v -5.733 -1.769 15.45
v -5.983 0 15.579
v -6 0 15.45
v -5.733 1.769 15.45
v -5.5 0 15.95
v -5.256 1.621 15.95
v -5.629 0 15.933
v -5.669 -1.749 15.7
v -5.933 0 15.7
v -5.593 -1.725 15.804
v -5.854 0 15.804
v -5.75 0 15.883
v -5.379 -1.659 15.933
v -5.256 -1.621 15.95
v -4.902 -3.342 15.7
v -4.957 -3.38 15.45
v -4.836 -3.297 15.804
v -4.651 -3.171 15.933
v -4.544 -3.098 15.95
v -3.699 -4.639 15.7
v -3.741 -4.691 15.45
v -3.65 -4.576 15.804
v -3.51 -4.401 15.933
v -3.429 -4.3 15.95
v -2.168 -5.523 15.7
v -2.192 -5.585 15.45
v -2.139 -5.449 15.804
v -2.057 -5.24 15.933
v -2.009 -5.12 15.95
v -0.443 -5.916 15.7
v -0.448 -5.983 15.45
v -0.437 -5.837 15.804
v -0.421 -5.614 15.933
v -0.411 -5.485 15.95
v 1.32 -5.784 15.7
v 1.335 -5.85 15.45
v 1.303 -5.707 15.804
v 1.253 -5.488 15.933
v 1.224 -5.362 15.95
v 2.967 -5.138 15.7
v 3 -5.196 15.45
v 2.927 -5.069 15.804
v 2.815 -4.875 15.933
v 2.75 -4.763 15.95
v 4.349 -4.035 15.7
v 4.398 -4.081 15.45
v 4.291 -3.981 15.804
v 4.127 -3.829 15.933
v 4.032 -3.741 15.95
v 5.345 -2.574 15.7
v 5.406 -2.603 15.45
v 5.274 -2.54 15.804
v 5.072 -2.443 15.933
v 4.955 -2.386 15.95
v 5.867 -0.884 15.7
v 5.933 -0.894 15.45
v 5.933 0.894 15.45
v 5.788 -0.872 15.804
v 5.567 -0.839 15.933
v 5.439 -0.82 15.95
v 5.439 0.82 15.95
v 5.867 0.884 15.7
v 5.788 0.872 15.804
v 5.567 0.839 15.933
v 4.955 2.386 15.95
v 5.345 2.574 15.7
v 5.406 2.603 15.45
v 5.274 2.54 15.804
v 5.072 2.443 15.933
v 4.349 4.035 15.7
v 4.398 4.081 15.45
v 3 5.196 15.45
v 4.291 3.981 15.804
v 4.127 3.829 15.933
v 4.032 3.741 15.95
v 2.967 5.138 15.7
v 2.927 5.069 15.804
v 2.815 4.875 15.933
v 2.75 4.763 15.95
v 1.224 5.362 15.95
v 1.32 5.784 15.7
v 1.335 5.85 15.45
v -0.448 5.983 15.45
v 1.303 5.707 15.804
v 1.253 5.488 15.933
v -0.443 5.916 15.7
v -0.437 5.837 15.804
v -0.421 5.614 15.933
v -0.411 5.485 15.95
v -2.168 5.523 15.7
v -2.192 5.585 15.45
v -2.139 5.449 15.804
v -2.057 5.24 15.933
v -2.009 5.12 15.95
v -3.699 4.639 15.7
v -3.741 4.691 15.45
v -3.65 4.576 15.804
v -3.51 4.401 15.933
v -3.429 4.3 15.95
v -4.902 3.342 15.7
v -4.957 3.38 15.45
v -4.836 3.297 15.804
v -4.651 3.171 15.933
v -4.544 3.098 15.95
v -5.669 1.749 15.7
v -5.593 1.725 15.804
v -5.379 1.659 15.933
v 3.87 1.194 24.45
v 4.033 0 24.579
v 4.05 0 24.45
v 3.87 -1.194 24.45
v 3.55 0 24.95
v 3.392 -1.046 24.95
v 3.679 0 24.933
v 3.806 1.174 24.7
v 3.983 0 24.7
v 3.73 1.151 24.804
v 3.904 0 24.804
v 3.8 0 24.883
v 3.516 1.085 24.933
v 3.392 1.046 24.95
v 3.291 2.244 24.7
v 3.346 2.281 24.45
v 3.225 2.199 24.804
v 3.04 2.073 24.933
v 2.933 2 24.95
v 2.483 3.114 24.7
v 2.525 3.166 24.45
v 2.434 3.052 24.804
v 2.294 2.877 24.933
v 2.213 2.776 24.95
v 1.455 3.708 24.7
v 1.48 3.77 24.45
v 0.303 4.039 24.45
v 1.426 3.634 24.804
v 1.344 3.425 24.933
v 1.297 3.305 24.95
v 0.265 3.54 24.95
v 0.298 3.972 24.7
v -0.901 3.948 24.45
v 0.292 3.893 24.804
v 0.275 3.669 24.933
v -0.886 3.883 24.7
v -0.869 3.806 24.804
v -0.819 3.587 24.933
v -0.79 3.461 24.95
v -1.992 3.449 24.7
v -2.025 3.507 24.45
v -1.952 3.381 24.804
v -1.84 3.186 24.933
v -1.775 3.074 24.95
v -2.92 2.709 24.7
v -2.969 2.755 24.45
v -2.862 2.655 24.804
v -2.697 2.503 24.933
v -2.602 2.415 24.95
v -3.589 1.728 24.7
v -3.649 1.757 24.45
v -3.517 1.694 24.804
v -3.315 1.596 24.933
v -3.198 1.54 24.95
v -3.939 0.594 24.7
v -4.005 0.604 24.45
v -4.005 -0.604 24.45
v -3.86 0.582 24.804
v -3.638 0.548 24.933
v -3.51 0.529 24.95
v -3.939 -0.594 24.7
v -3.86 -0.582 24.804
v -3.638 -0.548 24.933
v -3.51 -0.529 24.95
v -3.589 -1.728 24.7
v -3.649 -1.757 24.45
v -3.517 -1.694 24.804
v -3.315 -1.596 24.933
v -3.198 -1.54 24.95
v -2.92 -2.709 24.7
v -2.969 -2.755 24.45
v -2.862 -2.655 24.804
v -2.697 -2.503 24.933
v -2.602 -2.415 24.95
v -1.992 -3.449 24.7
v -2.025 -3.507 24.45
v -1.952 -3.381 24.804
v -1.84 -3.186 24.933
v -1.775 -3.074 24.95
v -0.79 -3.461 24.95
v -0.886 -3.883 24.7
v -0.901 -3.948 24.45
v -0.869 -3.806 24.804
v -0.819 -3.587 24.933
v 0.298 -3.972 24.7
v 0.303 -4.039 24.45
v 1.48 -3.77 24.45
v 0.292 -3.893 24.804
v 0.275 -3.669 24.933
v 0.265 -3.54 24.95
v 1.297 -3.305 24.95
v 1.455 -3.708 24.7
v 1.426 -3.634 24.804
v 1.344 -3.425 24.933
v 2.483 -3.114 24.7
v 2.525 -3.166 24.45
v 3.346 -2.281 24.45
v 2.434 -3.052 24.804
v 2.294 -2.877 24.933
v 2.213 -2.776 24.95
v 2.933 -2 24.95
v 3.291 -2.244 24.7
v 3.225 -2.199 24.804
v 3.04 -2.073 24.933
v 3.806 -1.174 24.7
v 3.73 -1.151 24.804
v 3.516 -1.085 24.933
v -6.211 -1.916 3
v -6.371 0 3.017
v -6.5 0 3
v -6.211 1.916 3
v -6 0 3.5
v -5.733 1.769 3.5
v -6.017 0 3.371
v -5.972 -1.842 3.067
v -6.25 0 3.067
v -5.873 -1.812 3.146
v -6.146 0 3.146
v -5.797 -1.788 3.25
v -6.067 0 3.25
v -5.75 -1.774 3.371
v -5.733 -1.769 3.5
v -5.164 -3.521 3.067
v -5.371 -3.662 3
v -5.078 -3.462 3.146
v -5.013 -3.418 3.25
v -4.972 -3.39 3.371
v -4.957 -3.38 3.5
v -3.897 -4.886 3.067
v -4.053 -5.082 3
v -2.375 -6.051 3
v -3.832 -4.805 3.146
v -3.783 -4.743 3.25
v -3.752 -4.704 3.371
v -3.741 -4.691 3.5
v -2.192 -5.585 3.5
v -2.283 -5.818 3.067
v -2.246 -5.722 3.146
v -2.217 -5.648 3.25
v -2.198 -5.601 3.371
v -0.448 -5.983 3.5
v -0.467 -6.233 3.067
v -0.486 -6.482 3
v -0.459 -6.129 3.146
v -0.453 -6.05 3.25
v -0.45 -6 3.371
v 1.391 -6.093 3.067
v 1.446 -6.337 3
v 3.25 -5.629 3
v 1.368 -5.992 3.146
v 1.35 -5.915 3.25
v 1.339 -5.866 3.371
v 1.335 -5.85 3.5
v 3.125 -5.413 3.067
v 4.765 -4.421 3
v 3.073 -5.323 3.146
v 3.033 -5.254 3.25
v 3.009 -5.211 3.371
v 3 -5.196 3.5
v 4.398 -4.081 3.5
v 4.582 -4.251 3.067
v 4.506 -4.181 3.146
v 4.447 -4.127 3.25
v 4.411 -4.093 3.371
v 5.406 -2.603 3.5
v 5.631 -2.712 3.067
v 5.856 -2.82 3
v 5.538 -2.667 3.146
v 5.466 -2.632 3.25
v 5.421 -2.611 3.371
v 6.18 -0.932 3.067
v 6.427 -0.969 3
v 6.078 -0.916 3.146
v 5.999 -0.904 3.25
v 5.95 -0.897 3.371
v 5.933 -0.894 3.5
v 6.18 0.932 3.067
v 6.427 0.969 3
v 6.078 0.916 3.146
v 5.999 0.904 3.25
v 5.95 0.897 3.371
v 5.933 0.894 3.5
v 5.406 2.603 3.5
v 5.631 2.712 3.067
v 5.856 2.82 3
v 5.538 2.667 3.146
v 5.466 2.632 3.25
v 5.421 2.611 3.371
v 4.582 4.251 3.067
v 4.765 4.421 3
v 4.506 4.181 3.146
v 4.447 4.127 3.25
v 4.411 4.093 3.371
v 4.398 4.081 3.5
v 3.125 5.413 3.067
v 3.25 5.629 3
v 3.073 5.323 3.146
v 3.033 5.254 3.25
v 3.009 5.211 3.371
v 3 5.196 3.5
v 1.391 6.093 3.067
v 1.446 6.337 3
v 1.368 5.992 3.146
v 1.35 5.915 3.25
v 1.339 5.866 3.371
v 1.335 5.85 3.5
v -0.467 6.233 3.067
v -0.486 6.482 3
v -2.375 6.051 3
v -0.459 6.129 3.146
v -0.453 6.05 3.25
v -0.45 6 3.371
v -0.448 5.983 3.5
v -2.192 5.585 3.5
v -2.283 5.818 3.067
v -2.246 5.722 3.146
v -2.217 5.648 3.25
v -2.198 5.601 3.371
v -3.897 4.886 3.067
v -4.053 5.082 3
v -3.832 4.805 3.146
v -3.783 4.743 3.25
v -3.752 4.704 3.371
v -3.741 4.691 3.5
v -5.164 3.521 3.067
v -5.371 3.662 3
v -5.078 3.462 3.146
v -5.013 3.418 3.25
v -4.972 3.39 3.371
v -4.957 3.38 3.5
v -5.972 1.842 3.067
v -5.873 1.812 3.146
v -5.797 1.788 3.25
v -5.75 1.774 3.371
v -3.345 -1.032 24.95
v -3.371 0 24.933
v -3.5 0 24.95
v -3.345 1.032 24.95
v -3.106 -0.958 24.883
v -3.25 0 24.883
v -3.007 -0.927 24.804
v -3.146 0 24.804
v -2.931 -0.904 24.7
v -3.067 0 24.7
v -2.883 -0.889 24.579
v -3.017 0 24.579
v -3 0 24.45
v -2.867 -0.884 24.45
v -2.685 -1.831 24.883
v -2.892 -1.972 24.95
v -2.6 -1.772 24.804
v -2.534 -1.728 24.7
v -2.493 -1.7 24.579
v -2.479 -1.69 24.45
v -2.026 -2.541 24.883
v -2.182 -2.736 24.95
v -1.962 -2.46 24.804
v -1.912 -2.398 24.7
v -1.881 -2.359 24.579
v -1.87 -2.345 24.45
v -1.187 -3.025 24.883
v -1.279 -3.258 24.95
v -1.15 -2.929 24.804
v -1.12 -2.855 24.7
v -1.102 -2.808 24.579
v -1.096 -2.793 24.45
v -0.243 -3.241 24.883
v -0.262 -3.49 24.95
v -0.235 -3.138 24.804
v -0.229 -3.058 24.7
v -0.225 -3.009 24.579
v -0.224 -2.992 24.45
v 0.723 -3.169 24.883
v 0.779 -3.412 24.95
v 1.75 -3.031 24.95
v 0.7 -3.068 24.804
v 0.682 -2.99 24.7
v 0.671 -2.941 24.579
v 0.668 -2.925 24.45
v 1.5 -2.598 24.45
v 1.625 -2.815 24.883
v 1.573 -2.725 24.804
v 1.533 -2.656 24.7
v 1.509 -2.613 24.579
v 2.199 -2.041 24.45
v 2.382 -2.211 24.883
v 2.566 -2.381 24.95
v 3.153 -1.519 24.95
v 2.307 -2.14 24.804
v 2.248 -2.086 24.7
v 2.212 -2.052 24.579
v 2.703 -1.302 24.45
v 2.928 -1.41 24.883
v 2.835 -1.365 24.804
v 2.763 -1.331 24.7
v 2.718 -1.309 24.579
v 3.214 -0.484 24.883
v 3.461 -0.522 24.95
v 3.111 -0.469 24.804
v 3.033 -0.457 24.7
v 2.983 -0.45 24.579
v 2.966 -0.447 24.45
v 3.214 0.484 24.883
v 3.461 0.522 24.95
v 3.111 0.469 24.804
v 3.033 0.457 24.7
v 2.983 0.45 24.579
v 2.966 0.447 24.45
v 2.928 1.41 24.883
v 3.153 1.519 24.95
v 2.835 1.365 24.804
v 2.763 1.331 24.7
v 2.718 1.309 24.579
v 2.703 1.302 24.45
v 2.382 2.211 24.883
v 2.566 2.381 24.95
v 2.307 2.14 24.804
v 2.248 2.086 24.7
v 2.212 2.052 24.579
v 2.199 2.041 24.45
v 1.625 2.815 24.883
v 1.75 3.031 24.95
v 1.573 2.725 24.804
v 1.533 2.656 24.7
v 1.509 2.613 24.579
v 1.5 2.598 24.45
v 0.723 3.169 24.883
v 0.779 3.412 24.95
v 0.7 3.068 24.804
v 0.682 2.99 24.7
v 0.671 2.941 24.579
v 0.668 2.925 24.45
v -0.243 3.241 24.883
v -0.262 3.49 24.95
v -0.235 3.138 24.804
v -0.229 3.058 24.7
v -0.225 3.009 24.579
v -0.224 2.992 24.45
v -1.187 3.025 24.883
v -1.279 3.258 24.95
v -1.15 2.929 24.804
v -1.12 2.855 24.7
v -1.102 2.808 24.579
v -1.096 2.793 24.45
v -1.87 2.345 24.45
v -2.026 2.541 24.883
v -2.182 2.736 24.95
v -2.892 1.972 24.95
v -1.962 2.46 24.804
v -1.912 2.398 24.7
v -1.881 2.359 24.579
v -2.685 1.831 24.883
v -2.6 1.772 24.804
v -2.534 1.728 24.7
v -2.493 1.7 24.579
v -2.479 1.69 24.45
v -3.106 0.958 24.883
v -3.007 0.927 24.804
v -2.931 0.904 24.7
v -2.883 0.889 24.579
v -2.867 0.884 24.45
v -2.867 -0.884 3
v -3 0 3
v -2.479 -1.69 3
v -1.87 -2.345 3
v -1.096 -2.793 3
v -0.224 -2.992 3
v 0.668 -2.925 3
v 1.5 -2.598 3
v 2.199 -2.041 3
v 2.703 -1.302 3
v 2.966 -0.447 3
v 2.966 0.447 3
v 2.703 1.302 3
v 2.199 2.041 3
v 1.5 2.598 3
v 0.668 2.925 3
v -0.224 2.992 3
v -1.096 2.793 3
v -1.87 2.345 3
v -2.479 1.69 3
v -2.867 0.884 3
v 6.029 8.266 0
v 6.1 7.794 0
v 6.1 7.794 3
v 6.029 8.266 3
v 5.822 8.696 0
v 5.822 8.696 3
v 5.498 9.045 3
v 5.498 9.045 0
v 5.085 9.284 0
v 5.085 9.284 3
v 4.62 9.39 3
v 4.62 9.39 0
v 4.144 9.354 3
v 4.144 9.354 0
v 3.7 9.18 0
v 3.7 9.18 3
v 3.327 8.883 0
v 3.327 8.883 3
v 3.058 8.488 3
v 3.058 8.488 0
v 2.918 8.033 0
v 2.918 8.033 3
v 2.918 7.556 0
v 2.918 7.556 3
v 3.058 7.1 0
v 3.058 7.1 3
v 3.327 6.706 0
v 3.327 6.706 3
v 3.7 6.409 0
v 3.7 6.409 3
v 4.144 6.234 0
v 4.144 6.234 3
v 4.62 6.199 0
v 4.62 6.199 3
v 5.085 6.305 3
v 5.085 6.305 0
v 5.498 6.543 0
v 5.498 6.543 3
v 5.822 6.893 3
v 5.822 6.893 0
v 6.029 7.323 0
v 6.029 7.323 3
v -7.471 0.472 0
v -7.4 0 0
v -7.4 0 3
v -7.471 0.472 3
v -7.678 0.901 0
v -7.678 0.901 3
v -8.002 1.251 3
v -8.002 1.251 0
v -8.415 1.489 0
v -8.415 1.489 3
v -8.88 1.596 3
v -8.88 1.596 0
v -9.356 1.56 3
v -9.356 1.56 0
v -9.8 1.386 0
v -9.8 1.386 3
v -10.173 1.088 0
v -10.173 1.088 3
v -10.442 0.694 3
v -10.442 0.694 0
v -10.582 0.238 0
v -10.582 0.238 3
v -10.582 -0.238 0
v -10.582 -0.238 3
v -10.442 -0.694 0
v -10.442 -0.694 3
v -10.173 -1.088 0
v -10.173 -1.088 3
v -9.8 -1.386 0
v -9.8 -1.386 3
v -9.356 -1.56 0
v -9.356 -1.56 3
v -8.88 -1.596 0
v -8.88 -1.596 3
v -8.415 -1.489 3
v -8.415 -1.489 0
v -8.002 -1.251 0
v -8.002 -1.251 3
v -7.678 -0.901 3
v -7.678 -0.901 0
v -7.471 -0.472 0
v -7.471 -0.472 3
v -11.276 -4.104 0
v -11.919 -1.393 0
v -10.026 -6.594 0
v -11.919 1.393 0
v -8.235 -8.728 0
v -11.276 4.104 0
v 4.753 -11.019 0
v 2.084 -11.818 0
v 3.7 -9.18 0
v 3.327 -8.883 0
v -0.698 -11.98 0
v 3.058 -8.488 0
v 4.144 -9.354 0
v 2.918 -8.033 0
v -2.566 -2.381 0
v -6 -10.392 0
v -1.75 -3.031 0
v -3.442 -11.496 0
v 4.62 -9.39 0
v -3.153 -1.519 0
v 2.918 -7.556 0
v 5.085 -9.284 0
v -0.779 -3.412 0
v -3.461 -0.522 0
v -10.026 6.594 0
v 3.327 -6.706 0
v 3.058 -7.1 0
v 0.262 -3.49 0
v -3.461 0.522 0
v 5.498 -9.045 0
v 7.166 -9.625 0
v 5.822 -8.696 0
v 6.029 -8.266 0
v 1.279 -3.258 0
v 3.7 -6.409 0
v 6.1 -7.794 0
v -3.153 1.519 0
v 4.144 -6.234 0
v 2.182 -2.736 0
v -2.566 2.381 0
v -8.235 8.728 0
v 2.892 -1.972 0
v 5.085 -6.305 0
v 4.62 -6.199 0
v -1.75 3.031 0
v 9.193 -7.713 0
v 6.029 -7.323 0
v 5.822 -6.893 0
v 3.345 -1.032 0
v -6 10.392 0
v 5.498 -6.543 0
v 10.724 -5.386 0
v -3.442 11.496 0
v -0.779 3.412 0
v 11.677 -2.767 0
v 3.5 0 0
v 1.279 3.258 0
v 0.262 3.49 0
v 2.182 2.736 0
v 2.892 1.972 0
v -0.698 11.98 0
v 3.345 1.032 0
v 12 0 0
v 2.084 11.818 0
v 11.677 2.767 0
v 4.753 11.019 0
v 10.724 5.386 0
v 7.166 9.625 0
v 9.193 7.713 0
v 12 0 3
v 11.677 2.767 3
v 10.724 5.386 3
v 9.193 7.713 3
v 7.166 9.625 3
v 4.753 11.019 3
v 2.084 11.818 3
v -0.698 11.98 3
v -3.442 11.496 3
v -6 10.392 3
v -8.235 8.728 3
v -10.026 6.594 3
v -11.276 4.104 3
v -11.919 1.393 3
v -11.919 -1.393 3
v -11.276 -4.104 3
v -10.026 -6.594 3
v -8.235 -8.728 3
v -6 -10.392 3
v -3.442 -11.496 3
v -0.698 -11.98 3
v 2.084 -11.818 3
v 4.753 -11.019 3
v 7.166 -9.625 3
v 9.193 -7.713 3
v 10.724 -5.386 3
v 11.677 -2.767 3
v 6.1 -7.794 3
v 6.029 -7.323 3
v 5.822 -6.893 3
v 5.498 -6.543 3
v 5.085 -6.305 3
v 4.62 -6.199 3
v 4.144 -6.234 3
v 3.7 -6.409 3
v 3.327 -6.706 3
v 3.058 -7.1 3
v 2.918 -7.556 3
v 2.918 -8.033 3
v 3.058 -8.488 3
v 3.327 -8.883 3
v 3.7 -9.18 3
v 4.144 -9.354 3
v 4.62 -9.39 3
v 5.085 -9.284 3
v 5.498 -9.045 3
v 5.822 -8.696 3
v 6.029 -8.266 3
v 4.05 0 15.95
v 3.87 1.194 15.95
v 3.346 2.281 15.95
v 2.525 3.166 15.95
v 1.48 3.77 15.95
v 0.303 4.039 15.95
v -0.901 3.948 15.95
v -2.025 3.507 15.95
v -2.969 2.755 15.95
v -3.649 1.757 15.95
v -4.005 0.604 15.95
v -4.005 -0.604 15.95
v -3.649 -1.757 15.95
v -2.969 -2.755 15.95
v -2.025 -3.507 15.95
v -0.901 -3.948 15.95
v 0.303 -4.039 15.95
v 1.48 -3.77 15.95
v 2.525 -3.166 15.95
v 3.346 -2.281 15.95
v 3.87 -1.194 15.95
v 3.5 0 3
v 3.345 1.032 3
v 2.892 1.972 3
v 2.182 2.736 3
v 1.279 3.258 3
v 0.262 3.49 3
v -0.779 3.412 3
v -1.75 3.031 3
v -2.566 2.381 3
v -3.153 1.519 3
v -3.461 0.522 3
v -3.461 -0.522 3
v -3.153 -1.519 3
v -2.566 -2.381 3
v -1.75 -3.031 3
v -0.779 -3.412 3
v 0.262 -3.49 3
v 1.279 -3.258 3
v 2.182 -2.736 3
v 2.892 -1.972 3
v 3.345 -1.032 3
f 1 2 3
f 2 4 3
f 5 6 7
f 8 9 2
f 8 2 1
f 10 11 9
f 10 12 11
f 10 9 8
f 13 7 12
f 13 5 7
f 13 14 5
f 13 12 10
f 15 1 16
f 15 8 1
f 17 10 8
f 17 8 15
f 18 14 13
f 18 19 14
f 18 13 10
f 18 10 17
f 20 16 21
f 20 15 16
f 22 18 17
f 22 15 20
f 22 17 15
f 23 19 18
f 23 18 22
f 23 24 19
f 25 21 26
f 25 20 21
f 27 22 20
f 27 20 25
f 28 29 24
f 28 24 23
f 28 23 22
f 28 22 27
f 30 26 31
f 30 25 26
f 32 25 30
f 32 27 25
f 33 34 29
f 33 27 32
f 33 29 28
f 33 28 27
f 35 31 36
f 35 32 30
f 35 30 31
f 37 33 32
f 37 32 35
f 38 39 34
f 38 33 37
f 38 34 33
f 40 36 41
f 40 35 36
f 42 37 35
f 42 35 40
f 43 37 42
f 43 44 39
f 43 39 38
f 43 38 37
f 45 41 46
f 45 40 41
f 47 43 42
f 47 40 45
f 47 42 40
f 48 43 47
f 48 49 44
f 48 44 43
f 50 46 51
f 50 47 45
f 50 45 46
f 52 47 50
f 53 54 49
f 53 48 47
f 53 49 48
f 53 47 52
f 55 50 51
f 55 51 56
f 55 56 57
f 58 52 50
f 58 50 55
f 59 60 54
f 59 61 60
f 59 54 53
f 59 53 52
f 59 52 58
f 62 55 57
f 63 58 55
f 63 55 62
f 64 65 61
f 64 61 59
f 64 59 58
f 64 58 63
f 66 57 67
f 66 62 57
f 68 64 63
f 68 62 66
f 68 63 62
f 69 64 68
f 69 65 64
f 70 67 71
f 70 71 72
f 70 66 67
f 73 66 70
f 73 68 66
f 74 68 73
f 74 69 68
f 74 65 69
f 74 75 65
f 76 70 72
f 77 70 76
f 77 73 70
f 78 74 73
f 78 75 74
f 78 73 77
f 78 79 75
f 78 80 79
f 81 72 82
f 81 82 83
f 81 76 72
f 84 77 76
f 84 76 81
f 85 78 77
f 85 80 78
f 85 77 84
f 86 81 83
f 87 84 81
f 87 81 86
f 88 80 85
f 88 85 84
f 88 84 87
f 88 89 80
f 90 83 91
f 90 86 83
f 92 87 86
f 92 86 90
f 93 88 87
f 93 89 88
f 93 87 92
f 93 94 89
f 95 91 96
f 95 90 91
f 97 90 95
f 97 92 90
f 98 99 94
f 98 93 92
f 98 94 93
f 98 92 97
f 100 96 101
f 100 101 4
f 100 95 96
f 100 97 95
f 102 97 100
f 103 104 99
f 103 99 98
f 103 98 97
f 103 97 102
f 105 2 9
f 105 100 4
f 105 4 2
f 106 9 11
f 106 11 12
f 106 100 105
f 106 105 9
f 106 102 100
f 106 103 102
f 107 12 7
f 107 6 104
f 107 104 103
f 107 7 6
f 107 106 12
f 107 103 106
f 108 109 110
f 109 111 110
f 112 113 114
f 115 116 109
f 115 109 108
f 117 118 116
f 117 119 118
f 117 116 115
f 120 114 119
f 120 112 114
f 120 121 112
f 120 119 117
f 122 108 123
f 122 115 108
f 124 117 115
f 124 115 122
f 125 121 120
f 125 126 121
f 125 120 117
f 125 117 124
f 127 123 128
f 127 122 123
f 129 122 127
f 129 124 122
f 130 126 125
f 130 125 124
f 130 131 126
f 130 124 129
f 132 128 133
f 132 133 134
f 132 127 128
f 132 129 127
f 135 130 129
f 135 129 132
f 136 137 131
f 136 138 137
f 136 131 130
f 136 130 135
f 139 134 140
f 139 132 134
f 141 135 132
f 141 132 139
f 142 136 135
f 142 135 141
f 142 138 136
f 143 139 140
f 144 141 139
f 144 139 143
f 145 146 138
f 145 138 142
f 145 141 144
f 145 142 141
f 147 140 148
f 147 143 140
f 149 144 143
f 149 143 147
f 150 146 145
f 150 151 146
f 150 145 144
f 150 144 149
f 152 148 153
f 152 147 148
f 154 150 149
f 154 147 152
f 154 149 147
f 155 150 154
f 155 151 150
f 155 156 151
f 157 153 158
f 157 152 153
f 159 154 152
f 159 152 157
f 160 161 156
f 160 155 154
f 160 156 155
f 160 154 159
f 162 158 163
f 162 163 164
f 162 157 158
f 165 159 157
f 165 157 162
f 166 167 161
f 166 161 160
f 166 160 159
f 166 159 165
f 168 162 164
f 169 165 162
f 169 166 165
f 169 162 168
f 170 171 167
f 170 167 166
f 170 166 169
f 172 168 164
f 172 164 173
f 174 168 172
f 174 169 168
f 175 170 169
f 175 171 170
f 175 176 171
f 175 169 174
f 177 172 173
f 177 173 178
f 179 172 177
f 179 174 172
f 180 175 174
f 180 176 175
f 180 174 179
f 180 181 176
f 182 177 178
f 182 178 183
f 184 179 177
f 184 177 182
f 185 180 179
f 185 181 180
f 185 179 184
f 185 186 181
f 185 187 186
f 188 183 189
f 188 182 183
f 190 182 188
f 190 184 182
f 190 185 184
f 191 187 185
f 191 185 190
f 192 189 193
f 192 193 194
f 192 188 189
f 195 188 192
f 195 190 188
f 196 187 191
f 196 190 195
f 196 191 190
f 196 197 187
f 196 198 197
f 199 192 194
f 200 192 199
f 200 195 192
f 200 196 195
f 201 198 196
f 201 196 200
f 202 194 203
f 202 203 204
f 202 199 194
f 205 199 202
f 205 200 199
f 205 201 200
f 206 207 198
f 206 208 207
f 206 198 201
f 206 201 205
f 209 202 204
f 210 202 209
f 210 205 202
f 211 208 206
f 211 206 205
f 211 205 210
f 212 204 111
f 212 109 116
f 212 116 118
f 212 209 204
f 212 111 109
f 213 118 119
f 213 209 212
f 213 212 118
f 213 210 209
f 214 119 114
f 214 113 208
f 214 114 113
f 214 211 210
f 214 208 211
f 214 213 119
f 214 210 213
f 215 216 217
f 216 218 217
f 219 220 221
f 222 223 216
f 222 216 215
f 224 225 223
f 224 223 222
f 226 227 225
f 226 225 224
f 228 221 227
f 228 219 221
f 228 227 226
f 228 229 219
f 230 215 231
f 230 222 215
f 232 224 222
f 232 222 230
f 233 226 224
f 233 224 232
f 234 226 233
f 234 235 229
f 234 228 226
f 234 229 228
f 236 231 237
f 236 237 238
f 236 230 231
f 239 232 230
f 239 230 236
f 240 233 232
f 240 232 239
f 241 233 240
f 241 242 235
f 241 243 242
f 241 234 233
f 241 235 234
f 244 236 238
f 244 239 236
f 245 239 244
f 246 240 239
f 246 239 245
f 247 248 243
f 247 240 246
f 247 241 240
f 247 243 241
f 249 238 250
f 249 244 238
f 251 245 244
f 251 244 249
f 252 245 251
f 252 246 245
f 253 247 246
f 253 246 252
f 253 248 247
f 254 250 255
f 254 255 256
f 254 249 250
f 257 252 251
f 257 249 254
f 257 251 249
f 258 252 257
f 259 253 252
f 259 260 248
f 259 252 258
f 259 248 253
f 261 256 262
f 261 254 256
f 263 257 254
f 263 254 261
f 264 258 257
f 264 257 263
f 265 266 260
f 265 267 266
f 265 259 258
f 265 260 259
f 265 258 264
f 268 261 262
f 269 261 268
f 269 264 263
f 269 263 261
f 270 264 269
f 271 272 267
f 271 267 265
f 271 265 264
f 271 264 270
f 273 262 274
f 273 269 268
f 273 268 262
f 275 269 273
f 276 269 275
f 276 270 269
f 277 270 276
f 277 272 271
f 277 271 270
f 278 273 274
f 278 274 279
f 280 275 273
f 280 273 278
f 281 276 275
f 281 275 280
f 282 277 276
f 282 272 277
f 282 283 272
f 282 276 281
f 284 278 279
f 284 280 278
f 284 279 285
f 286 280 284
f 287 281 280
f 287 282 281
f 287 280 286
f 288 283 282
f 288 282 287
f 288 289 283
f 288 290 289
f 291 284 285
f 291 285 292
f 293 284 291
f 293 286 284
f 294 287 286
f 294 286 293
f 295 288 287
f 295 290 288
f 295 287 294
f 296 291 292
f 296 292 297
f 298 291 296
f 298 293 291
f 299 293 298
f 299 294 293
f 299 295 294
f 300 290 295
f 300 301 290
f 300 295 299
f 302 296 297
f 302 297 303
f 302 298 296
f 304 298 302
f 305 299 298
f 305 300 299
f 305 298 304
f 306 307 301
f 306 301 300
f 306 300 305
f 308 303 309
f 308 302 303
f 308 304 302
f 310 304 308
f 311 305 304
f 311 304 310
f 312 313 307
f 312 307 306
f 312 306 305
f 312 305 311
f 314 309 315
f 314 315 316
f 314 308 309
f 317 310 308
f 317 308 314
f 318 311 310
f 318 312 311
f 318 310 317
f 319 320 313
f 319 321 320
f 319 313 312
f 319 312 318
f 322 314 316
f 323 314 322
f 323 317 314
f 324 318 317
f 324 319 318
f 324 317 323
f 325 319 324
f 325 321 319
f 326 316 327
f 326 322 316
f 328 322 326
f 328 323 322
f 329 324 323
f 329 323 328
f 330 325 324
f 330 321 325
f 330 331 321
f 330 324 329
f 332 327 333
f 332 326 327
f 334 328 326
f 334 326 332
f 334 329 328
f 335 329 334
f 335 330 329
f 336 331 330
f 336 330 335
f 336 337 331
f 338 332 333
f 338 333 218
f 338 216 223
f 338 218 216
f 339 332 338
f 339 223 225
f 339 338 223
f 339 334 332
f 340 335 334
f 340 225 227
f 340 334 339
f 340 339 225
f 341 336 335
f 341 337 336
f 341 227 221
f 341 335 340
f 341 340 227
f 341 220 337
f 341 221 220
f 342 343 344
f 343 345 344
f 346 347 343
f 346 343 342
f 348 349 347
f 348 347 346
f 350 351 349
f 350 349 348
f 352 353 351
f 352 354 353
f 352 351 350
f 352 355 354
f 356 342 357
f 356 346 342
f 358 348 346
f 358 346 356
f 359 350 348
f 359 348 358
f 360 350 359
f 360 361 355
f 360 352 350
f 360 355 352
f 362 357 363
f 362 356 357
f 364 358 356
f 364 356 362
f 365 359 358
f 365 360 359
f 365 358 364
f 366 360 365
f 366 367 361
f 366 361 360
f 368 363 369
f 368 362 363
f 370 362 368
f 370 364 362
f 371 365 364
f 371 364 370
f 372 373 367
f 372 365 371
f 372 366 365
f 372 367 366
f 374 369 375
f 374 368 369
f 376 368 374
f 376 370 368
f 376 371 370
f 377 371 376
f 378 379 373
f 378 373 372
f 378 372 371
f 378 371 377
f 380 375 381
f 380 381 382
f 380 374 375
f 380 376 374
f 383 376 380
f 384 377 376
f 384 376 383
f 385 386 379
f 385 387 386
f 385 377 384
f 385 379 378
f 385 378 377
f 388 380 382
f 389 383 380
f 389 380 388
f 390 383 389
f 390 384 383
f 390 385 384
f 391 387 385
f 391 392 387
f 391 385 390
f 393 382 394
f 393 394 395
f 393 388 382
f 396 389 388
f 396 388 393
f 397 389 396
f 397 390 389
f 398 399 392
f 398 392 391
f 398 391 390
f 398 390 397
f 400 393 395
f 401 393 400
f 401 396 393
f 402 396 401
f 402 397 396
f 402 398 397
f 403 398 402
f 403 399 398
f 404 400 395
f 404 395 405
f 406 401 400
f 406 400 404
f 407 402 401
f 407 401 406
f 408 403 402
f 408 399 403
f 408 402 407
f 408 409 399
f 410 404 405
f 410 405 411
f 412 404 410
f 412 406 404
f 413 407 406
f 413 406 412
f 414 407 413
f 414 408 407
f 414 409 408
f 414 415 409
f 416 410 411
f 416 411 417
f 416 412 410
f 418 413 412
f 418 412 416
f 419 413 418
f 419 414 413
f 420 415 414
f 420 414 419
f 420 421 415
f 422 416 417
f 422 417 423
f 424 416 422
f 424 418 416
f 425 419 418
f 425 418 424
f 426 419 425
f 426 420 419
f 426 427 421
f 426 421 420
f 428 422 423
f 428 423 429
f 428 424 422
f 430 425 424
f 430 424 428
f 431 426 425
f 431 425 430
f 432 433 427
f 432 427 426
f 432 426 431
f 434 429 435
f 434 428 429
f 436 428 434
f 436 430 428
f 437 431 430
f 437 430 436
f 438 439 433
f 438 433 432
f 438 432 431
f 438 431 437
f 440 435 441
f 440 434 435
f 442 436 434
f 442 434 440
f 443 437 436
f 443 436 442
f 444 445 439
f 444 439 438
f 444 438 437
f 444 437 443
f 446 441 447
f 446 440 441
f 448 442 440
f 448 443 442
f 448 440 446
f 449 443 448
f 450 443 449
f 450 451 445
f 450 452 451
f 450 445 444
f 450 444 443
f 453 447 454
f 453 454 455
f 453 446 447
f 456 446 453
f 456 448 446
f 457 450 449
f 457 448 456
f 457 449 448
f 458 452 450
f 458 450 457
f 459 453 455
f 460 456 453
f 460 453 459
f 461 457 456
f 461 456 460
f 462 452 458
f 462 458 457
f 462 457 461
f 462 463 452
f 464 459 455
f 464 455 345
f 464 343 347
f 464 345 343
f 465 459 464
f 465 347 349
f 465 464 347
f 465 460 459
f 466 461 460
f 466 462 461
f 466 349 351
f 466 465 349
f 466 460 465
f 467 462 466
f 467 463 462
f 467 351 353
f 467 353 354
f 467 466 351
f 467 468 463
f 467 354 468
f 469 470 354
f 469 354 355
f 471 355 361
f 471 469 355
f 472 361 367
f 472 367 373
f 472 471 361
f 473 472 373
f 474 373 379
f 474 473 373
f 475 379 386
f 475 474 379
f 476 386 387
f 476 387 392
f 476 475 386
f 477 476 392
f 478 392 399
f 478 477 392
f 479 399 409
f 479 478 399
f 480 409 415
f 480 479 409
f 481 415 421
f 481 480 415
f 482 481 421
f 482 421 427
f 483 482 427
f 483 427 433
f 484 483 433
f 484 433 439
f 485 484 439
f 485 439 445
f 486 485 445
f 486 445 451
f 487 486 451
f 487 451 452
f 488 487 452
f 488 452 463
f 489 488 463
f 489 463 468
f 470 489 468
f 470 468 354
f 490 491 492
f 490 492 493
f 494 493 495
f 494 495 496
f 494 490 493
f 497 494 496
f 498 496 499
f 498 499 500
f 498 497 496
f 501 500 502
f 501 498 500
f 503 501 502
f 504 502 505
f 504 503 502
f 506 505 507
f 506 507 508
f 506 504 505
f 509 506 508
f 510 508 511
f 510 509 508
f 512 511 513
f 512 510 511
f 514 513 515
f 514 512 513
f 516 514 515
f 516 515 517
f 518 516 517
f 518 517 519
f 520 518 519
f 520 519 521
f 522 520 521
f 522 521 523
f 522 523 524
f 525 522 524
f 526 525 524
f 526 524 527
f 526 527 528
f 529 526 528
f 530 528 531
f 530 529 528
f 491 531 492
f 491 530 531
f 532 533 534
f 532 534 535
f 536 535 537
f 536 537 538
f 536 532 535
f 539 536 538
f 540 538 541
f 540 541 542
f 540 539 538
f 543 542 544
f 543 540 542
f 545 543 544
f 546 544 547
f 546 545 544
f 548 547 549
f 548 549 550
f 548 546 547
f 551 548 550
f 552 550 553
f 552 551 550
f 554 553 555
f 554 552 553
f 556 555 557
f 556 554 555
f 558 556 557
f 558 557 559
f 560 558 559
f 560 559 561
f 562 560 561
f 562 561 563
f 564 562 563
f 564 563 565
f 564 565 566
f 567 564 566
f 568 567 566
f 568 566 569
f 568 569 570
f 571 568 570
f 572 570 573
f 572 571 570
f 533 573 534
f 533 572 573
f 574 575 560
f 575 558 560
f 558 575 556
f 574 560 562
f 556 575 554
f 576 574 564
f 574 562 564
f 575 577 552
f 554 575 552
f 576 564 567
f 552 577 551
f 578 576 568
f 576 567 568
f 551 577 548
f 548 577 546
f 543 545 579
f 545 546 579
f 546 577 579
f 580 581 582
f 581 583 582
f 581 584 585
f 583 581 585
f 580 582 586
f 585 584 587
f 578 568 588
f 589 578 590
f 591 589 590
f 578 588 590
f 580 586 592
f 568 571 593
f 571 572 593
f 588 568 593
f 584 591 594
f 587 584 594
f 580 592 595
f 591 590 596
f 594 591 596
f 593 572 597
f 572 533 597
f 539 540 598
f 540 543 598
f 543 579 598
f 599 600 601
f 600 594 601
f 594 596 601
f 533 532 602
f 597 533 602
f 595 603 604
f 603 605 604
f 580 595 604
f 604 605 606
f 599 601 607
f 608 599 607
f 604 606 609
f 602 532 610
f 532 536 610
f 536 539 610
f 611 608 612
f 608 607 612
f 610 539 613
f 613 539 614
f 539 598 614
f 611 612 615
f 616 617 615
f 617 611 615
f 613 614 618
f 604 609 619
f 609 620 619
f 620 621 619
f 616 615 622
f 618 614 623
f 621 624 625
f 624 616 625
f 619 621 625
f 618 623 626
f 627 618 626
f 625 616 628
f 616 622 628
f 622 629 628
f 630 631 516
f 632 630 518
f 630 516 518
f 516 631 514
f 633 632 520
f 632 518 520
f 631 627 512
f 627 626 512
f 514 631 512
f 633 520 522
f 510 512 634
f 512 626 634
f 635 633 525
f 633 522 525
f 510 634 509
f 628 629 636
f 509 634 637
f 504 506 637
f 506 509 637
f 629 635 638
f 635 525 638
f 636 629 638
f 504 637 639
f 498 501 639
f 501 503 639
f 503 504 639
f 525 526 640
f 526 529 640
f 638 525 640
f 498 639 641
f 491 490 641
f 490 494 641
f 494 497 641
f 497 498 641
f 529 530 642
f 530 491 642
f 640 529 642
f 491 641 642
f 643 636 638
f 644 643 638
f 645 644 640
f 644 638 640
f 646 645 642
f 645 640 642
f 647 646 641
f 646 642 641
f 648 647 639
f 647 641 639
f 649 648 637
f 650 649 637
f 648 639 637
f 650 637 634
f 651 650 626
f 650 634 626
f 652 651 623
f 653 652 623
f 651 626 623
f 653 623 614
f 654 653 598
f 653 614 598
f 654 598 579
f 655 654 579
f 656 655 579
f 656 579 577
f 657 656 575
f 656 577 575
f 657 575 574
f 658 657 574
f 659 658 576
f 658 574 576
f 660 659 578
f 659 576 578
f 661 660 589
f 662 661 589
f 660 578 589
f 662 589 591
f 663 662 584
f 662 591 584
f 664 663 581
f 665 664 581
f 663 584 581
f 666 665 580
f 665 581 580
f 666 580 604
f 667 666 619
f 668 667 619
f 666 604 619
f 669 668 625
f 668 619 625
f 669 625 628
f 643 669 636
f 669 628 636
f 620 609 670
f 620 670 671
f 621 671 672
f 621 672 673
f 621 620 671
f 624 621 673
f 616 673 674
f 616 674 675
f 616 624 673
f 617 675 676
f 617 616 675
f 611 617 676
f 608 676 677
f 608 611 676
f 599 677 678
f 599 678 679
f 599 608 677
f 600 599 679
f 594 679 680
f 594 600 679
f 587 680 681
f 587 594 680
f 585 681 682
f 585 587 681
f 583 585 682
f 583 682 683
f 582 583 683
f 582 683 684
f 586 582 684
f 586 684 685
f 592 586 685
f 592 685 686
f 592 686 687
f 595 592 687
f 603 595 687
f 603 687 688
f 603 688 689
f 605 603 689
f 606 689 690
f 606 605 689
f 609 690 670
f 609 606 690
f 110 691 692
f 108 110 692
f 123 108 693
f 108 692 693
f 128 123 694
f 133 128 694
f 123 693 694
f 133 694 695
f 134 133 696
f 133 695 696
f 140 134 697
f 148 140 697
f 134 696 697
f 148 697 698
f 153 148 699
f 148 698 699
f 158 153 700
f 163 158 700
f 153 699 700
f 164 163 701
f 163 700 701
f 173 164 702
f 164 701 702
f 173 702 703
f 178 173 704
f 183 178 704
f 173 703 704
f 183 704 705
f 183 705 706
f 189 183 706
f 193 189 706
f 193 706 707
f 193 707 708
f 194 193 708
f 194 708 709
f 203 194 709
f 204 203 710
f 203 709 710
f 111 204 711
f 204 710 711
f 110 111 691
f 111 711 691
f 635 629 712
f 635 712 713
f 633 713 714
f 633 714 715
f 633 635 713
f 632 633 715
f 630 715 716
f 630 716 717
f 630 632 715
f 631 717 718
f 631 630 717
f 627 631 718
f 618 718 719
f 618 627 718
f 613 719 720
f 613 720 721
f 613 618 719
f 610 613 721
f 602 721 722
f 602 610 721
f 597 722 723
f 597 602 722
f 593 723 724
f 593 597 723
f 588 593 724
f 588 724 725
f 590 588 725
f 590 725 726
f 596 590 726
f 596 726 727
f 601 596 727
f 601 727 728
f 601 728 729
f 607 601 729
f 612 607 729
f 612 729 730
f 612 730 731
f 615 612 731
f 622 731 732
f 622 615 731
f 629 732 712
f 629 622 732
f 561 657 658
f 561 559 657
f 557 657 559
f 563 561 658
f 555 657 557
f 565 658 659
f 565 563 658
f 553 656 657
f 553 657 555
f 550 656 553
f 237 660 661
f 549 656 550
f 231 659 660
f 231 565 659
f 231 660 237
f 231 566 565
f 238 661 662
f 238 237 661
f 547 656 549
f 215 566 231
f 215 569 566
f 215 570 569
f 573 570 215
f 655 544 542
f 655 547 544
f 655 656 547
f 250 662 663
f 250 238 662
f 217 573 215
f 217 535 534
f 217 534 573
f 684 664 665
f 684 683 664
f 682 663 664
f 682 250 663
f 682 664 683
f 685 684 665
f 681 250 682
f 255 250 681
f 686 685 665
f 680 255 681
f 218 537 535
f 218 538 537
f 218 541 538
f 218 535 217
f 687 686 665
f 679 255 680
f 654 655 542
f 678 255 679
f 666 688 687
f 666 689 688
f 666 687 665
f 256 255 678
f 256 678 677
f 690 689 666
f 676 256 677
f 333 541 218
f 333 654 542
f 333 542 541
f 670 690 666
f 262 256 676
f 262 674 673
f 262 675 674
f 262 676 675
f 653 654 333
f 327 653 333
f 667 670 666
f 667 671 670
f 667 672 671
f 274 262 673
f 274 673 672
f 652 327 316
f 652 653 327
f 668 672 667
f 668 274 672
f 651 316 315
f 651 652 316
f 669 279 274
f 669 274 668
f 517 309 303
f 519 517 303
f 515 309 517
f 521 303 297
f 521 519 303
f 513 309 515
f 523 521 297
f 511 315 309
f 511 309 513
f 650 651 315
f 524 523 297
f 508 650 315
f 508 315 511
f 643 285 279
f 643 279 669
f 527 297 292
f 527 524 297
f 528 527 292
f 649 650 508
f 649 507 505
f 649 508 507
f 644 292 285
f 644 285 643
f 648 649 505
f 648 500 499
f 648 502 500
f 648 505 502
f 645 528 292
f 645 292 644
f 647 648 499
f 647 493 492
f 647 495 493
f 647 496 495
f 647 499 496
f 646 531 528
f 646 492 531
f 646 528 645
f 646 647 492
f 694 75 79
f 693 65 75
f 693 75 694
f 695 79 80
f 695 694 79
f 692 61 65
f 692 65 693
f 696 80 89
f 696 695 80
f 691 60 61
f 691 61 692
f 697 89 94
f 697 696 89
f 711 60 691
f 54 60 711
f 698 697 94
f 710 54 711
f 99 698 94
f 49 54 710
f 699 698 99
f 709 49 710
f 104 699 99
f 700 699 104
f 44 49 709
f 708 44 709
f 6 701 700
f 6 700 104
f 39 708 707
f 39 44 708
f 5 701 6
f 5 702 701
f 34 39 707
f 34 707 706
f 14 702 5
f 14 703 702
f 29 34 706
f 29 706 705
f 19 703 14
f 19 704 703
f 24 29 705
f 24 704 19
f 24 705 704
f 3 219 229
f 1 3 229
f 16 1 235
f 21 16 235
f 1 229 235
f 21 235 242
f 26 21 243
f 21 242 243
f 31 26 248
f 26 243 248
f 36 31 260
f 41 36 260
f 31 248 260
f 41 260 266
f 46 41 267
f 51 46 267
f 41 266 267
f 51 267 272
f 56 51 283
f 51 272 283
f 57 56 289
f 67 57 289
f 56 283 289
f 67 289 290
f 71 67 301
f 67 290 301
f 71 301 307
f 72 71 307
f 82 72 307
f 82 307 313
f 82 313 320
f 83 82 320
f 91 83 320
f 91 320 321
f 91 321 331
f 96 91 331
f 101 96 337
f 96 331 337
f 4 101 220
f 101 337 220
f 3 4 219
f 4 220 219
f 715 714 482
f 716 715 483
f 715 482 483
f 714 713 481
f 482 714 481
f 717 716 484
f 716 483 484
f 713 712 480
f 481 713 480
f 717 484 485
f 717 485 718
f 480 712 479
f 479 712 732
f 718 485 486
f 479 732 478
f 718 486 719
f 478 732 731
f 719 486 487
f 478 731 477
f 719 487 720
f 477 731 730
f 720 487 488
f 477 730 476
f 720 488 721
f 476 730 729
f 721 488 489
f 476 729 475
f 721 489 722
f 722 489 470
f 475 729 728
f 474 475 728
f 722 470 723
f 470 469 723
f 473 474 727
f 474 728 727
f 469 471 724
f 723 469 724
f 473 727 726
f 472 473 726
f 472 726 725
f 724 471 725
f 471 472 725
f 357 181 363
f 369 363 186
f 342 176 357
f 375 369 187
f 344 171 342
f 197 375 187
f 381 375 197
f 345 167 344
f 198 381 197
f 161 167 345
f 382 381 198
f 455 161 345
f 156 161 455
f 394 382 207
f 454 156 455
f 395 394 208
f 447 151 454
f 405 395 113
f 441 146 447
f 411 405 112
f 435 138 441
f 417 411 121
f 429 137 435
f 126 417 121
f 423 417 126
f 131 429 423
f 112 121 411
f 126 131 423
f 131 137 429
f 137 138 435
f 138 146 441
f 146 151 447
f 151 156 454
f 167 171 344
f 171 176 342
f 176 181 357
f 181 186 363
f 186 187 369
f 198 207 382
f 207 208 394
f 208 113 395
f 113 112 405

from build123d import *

# Parameters (mm, degrees)
CROQUIS1_R              = 12
CROQUIS1_R_2            = 1.6
CROQUIS1_R_3            = 3.5
SALIENTE_EXTRUIR1_DEPTH = 3
CROQUIS2_R              = 6
CROQUIS2_R_2            = 3
SALIENTE_EXTRUIR2_DEPTH = 12.95
CROQUIS3_R              = 4.05
CROQUIS3_R_2            = 3
SALIENTE_EXTRUIR3_DEPTH = 9
REDONDEO1_R             = 0.5


with BuildPart() as part:
    # Croquis1 → Saliente-Extruir1 (new body)
    with BuildSketch(Plane(origin=(0, 0, 0), x_dir=(0, 1, 0), z_dir=(0, 0, 1))):
        with Locations(Location((0, 0, 0), (0, 0, 270))):
            Circle(CROQUIS1_R)
        with Locations(Location((0, 9, 0), (0, 0, 270))):
            Circle(CROQUIS1_R_2, mode=Mode.SUBTRACT)
        with Locations(Location((7.794228634, -4.5, 0), (0, 0, 270))):
            Circle(CROQUIS1_R_2, mode=Mode.SUBTRACT)
        with Locations(Location((-7.794228634, -4.5, 0), (0, 0, 270))):
            Circle(CROQUIS1_R_2, mode=Mode.SUBTRACT)
        with Locations(Location((0, 0, 0), (0, 0, 270))):
            Circle(CROQUIS1_R_3, mode=Mode.SUBTRACT)
    extrude(amount=SALIENTE_EXTRUIR1_DEPTH)

    # Croquis2 → Saliente-Extruir2 (add)
    with BuildSketch(Plane.XY.offset(3)):
        with Locations(Location((0, 0, 0), (0, 0, 180))):
            Circle(CROQUIS2_R)
        with Locations(Location((0, 0, 0), (0, 0, 180))):
            Circle(CROQUIS2_R_2, mode=Mode.SUBTRACT)
    extrude(amount=SALIENTE_EXTRUIR2_DEPTH)

    # Croquis3 → Saliente-Extruir3 (add)
    with BuildSketch(Plane.XY.offset(15.95)):
        Circle(CROQUIS3_R)
        with Locations(Location((0, 0, 0), (0, 0, 180))):
            Circle(CROQUIS3_R_2, mode=Mode.SUBTRACT)
    extrude(amount=SALIENTE_EXTRUIR3_DEPTH)

    # Redondeo1
    redondeo1_edges = [part.edges().sort_by_distance(p)[0] for p in [
        (6, 0, 3),
        (6, 0, 15.95),
        (-4.05, 0, 24.95),
        (3, 0, 24.95),
    ]]
    fillet(redondeo1_edges, radius=REDONDEO1_R)


solid = part.part
